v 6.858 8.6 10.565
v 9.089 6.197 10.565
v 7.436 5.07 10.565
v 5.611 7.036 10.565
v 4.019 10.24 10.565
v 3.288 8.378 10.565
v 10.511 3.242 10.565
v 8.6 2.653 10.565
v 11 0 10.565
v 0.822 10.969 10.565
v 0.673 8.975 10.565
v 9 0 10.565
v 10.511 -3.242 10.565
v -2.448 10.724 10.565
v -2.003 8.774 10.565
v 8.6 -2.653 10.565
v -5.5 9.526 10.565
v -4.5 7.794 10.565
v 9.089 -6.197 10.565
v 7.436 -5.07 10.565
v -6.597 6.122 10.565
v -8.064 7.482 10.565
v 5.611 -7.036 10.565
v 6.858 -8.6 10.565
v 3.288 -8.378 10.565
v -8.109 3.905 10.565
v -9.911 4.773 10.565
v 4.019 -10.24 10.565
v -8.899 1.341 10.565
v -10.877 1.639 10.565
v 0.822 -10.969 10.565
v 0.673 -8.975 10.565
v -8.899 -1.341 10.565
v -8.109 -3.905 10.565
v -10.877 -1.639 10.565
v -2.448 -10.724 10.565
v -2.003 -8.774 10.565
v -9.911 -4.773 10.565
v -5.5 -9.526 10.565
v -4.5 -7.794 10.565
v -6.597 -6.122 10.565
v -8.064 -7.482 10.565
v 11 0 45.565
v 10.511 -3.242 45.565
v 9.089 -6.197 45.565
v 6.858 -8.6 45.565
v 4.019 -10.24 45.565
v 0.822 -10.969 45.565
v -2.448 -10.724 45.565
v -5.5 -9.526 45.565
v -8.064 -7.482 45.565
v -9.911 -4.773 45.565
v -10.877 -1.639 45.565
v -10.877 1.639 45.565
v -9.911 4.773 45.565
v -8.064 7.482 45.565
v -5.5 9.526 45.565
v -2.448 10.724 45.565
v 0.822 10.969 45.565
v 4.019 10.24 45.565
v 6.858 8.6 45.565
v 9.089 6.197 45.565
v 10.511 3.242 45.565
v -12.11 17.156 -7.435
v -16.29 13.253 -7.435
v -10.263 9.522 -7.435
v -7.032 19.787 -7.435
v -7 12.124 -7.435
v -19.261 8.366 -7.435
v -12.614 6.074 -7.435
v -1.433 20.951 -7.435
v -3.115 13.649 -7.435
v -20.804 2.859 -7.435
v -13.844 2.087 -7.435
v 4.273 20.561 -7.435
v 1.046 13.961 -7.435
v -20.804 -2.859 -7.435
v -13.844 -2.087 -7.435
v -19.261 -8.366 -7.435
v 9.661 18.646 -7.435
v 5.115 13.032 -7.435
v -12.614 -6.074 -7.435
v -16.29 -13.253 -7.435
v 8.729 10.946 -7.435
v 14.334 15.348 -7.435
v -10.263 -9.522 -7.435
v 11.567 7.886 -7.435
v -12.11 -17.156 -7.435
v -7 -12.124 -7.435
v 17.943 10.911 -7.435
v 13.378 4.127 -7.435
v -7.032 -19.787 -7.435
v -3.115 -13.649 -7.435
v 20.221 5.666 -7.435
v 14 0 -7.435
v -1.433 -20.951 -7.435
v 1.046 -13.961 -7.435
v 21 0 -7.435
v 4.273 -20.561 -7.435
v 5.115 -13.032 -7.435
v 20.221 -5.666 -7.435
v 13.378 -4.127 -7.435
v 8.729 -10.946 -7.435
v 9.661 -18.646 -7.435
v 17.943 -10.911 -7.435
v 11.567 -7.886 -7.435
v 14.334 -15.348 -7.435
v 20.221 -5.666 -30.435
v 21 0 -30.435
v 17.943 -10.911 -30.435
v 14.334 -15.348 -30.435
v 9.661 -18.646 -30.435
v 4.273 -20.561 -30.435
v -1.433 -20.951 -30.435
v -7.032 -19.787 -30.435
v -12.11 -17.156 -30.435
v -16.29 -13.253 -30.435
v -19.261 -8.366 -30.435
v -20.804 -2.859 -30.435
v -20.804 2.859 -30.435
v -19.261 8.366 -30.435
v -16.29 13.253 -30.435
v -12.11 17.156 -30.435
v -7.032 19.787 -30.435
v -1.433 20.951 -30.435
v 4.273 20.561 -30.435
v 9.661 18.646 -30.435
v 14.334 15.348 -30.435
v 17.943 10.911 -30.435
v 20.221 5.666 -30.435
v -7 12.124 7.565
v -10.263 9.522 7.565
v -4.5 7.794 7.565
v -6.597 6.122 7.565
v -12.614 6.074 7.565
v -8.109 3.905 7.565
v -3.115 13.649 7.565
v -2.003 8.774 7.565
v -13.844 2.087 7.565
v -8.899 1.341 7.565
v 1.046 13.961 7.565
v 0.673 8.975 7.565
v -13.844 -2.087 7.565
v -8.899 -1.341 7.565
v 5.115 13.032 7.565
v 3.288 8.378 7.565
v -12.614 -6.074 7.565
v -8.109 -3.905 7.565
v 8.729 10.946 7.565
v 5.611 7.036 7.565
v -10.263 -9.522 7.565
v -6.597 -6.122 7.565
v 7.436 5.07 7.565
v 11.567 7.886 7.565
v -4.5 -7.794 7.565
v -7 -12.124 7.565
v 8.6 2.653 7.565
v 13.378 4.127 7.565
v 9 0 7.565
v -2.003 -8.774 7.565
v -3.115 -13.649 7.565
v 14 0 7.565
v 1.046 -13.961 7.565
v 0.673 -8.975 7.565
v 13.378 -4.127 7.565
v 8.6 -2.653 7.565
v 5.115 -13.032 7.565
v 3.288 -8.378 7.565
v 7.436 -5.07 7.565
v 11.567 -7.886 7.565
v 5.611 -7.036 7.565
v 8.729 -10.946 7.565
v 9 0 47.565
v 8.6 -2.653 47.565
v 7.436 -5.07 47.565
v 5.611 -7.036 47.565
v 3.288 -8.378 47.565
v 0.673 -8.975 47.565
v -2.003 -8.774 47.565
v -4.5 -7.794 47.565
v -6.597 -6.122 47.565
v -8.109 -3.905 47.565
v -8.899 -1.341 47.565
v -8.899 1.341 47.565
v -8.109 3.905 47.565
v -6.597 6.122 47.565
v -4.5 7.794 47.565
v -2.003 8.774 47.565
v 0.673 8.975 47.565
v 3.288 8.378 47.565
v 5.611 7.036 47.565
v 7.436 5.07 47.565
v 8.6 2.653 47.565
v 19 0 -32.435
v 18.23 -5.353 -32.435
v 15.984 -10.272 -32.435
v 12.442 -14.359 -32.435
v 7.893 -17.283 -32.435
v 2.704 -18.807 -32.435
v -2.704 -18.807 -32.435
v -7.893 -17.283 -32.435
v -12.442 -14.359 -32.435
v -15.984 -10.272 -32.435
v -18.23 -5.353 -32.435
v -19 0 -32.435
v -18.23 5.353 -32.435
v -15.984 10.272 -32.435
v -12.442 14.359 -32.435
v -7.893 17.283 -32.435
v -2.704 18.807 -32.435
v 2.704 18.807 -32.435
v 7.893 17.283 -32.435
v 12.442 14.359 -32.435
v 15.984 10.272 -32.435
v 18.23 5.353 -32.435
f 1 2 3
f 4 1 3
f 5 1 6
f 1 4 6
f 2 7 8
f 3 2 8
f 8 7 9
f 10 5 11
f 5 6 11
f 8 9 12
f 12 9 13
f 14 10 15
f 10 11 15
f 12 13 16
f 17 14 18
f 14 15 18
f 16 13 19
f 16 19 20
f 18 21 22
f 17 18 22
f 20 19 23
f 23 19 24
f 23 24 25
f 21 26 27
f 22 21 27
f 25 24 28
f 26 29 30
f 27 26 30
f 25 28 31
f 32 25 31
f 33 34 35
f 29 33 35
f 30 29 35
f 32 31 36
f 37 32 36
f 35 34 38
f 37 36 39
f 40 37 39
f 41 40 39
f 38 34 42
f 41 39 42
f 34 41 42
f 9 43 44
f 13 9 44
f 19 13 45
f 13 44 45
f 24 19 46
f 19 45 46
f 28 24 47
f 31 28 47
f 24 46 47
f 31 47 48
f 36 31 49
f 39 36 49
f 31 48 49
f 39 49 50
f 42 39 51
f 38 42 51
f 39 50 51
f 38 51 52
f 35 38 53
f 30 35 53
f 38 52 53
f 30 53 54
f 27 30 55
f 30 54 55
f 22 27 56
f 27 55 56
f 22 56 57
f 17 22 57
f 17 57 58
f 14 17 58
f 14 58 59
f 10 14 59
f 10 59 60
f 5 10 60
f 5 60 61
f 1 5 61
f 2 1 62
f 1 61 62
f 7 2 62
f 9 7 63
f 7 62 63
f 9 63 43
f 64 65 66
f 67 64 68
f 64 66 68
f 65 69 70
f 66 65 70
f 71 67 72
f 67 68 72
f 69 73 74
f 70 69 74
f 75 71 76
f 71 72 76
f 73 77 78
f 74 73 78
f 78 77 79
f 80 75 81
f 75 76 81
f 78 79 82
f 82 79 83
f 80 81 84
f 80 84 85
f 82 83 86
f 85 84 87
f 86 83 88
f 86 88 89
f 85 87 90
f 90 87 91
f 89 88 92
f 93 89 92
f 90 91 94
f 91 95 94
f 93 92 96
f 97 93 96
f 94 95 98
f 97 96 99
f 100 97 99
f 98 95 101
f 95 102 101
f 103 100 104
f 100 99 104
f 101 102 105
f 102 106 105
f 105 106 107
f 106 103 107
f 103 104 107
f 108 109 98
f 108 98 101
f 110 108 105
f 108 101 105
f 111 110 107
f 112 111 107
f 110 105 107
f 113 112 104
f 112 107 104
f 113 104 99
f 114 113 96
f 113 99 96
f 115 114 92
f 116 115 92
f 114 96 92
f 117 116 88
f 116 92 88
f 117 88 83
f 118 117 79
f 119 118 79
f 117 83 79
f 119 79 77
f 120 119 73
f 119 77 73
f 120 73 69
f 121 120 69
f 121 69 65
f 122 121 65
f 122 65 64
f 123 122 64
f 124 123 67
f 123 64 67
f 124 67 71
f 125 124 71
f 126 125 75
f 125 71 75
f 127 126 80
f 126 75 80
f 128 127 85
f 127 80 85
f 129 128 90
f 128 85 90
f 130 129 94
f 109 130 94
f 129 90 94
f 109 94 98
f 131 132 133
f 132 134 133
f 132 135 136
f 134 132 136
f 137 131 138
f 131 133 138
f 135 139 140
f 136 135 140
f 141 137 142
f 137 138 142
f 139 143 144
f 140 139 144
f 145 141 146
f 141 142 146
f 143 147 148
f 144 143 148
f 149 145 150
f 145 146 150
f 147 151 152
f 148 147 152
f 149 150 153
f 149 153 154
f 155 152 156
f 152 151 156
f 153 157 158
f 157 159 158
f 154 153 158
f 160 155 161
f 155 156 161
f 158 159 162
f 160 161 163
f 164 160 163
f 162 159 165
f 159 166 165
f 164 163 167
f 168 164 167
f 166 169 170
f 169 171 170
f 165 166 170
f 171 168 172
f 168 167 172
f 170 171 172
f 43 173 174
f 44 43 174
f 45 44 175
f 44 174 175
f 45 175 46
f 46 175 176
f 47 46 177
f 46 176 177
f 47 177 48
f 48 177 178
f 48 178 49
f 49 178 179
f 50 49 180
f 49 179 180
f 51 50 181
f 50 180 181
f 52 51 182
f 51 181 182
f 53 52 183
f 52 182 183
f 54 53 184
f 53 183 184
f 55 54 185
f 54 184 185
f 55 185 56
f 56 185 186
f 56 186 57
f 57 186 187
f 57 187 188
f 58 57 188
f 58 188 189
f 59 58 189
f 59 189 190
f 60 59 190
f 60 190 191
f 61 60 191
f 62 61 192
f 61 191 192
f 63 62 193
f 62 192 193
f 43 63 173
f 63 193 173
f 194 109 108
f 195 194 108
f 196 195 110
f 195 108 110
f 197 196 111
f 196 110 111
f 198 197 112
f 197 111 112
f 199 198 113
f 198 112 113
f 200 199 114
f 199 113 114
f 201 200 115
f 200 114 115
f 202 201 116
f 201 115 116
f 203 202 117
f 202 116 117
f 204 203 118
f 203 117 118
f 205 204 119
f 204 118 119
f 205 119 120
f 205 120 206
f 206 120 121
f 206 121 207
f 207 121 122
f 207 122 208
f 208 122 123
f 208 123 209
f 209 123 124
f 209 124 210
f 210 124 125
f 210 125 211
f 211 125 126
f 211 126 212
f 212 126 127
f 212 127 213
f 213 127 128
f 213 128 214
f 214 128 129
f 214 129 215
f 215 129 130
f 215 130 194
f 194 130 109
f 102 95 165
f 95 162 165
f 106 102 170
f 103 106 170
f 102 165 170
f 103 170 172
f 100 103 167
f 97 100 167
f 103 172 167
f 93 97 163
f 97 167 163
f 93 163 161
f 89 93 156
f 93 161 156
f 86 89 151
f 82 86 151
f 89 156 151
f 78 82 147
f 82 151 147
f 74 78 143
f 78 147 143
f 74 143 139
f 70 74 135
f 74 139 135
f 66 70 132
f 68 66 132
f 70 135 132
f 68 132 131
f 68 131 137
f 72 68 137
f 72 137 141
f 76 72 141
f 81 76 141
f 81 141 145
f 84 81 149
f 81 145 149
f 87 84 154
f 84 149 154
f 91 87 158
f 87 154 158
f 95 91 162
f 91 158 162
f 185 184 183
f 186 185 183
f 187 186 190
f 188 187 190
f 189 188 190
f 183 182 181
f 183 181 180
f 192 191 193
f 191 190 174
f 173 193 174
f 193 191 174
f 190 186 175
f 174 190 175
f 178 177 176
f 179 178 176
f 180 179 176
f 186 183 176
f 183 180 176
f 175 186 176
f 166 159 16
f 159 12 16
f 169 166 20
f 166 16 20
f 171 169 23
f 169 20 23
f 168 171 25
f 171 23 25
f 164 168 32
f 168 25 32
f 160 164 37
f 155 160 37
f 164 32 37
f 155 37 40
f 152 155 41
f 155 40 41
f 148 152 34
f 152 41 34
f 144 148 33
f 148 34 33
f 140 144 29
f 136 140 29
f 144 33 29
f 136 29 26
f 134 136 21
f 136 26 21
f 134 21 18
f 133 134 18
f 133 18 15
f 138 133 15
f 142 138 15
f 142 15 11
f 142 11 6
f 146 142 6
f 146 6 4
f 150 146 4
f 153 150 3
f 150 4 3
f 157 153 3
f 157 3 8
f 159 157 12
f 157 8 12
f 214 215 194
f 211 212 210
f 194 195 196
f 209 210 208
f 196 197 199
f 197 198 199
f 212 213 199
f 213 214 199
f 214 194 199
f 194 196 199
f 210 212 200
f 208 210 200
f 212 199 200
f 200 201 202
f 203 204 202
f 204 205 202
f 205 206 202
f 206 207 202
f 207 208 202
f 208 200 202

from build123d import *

# Parameters (mm, degrees)
F0_W     = 9
F0_H     = 3
F2_SIZE2 = 2
F2_SIZE  = 2


with BuildPart() as f1:
    # F0 (on Front) → F1 (revolve)
    with BuildSketch(Plane.XZ):
        Polygon((0, 47.565076), (0, 10.565076), (9, 10.565076), (11, 10.565076), (11, 47.565076), align=None)
        with Locations((4.5, 9.065076)):
            Rectangle(F0_W, F0_H)
        Polygon((0, 7.565076), (0, -7.434924), (14, -7.434924), (14, 7.565076), (9, 7.565076), align=None)
        Polygon((0, -7.434924), (0, -32.434924), (21, -32.434924), (21, -7.434924), (14, -7.434924), align=None)
    revolve(axis=Axis((0, 0, 7.565076), (0, 0, -1)))

    # F2
    f2_edges = [f1.edges().sort_by_distance(p)[0] for p in [
        (-11, 0, 47.565076),
        (-21, 0, -32.434924),
    ]]
    chamfer(f2_edges, length=F2_SIZE, length2=F2_SIZE2)


solid = f1.part
